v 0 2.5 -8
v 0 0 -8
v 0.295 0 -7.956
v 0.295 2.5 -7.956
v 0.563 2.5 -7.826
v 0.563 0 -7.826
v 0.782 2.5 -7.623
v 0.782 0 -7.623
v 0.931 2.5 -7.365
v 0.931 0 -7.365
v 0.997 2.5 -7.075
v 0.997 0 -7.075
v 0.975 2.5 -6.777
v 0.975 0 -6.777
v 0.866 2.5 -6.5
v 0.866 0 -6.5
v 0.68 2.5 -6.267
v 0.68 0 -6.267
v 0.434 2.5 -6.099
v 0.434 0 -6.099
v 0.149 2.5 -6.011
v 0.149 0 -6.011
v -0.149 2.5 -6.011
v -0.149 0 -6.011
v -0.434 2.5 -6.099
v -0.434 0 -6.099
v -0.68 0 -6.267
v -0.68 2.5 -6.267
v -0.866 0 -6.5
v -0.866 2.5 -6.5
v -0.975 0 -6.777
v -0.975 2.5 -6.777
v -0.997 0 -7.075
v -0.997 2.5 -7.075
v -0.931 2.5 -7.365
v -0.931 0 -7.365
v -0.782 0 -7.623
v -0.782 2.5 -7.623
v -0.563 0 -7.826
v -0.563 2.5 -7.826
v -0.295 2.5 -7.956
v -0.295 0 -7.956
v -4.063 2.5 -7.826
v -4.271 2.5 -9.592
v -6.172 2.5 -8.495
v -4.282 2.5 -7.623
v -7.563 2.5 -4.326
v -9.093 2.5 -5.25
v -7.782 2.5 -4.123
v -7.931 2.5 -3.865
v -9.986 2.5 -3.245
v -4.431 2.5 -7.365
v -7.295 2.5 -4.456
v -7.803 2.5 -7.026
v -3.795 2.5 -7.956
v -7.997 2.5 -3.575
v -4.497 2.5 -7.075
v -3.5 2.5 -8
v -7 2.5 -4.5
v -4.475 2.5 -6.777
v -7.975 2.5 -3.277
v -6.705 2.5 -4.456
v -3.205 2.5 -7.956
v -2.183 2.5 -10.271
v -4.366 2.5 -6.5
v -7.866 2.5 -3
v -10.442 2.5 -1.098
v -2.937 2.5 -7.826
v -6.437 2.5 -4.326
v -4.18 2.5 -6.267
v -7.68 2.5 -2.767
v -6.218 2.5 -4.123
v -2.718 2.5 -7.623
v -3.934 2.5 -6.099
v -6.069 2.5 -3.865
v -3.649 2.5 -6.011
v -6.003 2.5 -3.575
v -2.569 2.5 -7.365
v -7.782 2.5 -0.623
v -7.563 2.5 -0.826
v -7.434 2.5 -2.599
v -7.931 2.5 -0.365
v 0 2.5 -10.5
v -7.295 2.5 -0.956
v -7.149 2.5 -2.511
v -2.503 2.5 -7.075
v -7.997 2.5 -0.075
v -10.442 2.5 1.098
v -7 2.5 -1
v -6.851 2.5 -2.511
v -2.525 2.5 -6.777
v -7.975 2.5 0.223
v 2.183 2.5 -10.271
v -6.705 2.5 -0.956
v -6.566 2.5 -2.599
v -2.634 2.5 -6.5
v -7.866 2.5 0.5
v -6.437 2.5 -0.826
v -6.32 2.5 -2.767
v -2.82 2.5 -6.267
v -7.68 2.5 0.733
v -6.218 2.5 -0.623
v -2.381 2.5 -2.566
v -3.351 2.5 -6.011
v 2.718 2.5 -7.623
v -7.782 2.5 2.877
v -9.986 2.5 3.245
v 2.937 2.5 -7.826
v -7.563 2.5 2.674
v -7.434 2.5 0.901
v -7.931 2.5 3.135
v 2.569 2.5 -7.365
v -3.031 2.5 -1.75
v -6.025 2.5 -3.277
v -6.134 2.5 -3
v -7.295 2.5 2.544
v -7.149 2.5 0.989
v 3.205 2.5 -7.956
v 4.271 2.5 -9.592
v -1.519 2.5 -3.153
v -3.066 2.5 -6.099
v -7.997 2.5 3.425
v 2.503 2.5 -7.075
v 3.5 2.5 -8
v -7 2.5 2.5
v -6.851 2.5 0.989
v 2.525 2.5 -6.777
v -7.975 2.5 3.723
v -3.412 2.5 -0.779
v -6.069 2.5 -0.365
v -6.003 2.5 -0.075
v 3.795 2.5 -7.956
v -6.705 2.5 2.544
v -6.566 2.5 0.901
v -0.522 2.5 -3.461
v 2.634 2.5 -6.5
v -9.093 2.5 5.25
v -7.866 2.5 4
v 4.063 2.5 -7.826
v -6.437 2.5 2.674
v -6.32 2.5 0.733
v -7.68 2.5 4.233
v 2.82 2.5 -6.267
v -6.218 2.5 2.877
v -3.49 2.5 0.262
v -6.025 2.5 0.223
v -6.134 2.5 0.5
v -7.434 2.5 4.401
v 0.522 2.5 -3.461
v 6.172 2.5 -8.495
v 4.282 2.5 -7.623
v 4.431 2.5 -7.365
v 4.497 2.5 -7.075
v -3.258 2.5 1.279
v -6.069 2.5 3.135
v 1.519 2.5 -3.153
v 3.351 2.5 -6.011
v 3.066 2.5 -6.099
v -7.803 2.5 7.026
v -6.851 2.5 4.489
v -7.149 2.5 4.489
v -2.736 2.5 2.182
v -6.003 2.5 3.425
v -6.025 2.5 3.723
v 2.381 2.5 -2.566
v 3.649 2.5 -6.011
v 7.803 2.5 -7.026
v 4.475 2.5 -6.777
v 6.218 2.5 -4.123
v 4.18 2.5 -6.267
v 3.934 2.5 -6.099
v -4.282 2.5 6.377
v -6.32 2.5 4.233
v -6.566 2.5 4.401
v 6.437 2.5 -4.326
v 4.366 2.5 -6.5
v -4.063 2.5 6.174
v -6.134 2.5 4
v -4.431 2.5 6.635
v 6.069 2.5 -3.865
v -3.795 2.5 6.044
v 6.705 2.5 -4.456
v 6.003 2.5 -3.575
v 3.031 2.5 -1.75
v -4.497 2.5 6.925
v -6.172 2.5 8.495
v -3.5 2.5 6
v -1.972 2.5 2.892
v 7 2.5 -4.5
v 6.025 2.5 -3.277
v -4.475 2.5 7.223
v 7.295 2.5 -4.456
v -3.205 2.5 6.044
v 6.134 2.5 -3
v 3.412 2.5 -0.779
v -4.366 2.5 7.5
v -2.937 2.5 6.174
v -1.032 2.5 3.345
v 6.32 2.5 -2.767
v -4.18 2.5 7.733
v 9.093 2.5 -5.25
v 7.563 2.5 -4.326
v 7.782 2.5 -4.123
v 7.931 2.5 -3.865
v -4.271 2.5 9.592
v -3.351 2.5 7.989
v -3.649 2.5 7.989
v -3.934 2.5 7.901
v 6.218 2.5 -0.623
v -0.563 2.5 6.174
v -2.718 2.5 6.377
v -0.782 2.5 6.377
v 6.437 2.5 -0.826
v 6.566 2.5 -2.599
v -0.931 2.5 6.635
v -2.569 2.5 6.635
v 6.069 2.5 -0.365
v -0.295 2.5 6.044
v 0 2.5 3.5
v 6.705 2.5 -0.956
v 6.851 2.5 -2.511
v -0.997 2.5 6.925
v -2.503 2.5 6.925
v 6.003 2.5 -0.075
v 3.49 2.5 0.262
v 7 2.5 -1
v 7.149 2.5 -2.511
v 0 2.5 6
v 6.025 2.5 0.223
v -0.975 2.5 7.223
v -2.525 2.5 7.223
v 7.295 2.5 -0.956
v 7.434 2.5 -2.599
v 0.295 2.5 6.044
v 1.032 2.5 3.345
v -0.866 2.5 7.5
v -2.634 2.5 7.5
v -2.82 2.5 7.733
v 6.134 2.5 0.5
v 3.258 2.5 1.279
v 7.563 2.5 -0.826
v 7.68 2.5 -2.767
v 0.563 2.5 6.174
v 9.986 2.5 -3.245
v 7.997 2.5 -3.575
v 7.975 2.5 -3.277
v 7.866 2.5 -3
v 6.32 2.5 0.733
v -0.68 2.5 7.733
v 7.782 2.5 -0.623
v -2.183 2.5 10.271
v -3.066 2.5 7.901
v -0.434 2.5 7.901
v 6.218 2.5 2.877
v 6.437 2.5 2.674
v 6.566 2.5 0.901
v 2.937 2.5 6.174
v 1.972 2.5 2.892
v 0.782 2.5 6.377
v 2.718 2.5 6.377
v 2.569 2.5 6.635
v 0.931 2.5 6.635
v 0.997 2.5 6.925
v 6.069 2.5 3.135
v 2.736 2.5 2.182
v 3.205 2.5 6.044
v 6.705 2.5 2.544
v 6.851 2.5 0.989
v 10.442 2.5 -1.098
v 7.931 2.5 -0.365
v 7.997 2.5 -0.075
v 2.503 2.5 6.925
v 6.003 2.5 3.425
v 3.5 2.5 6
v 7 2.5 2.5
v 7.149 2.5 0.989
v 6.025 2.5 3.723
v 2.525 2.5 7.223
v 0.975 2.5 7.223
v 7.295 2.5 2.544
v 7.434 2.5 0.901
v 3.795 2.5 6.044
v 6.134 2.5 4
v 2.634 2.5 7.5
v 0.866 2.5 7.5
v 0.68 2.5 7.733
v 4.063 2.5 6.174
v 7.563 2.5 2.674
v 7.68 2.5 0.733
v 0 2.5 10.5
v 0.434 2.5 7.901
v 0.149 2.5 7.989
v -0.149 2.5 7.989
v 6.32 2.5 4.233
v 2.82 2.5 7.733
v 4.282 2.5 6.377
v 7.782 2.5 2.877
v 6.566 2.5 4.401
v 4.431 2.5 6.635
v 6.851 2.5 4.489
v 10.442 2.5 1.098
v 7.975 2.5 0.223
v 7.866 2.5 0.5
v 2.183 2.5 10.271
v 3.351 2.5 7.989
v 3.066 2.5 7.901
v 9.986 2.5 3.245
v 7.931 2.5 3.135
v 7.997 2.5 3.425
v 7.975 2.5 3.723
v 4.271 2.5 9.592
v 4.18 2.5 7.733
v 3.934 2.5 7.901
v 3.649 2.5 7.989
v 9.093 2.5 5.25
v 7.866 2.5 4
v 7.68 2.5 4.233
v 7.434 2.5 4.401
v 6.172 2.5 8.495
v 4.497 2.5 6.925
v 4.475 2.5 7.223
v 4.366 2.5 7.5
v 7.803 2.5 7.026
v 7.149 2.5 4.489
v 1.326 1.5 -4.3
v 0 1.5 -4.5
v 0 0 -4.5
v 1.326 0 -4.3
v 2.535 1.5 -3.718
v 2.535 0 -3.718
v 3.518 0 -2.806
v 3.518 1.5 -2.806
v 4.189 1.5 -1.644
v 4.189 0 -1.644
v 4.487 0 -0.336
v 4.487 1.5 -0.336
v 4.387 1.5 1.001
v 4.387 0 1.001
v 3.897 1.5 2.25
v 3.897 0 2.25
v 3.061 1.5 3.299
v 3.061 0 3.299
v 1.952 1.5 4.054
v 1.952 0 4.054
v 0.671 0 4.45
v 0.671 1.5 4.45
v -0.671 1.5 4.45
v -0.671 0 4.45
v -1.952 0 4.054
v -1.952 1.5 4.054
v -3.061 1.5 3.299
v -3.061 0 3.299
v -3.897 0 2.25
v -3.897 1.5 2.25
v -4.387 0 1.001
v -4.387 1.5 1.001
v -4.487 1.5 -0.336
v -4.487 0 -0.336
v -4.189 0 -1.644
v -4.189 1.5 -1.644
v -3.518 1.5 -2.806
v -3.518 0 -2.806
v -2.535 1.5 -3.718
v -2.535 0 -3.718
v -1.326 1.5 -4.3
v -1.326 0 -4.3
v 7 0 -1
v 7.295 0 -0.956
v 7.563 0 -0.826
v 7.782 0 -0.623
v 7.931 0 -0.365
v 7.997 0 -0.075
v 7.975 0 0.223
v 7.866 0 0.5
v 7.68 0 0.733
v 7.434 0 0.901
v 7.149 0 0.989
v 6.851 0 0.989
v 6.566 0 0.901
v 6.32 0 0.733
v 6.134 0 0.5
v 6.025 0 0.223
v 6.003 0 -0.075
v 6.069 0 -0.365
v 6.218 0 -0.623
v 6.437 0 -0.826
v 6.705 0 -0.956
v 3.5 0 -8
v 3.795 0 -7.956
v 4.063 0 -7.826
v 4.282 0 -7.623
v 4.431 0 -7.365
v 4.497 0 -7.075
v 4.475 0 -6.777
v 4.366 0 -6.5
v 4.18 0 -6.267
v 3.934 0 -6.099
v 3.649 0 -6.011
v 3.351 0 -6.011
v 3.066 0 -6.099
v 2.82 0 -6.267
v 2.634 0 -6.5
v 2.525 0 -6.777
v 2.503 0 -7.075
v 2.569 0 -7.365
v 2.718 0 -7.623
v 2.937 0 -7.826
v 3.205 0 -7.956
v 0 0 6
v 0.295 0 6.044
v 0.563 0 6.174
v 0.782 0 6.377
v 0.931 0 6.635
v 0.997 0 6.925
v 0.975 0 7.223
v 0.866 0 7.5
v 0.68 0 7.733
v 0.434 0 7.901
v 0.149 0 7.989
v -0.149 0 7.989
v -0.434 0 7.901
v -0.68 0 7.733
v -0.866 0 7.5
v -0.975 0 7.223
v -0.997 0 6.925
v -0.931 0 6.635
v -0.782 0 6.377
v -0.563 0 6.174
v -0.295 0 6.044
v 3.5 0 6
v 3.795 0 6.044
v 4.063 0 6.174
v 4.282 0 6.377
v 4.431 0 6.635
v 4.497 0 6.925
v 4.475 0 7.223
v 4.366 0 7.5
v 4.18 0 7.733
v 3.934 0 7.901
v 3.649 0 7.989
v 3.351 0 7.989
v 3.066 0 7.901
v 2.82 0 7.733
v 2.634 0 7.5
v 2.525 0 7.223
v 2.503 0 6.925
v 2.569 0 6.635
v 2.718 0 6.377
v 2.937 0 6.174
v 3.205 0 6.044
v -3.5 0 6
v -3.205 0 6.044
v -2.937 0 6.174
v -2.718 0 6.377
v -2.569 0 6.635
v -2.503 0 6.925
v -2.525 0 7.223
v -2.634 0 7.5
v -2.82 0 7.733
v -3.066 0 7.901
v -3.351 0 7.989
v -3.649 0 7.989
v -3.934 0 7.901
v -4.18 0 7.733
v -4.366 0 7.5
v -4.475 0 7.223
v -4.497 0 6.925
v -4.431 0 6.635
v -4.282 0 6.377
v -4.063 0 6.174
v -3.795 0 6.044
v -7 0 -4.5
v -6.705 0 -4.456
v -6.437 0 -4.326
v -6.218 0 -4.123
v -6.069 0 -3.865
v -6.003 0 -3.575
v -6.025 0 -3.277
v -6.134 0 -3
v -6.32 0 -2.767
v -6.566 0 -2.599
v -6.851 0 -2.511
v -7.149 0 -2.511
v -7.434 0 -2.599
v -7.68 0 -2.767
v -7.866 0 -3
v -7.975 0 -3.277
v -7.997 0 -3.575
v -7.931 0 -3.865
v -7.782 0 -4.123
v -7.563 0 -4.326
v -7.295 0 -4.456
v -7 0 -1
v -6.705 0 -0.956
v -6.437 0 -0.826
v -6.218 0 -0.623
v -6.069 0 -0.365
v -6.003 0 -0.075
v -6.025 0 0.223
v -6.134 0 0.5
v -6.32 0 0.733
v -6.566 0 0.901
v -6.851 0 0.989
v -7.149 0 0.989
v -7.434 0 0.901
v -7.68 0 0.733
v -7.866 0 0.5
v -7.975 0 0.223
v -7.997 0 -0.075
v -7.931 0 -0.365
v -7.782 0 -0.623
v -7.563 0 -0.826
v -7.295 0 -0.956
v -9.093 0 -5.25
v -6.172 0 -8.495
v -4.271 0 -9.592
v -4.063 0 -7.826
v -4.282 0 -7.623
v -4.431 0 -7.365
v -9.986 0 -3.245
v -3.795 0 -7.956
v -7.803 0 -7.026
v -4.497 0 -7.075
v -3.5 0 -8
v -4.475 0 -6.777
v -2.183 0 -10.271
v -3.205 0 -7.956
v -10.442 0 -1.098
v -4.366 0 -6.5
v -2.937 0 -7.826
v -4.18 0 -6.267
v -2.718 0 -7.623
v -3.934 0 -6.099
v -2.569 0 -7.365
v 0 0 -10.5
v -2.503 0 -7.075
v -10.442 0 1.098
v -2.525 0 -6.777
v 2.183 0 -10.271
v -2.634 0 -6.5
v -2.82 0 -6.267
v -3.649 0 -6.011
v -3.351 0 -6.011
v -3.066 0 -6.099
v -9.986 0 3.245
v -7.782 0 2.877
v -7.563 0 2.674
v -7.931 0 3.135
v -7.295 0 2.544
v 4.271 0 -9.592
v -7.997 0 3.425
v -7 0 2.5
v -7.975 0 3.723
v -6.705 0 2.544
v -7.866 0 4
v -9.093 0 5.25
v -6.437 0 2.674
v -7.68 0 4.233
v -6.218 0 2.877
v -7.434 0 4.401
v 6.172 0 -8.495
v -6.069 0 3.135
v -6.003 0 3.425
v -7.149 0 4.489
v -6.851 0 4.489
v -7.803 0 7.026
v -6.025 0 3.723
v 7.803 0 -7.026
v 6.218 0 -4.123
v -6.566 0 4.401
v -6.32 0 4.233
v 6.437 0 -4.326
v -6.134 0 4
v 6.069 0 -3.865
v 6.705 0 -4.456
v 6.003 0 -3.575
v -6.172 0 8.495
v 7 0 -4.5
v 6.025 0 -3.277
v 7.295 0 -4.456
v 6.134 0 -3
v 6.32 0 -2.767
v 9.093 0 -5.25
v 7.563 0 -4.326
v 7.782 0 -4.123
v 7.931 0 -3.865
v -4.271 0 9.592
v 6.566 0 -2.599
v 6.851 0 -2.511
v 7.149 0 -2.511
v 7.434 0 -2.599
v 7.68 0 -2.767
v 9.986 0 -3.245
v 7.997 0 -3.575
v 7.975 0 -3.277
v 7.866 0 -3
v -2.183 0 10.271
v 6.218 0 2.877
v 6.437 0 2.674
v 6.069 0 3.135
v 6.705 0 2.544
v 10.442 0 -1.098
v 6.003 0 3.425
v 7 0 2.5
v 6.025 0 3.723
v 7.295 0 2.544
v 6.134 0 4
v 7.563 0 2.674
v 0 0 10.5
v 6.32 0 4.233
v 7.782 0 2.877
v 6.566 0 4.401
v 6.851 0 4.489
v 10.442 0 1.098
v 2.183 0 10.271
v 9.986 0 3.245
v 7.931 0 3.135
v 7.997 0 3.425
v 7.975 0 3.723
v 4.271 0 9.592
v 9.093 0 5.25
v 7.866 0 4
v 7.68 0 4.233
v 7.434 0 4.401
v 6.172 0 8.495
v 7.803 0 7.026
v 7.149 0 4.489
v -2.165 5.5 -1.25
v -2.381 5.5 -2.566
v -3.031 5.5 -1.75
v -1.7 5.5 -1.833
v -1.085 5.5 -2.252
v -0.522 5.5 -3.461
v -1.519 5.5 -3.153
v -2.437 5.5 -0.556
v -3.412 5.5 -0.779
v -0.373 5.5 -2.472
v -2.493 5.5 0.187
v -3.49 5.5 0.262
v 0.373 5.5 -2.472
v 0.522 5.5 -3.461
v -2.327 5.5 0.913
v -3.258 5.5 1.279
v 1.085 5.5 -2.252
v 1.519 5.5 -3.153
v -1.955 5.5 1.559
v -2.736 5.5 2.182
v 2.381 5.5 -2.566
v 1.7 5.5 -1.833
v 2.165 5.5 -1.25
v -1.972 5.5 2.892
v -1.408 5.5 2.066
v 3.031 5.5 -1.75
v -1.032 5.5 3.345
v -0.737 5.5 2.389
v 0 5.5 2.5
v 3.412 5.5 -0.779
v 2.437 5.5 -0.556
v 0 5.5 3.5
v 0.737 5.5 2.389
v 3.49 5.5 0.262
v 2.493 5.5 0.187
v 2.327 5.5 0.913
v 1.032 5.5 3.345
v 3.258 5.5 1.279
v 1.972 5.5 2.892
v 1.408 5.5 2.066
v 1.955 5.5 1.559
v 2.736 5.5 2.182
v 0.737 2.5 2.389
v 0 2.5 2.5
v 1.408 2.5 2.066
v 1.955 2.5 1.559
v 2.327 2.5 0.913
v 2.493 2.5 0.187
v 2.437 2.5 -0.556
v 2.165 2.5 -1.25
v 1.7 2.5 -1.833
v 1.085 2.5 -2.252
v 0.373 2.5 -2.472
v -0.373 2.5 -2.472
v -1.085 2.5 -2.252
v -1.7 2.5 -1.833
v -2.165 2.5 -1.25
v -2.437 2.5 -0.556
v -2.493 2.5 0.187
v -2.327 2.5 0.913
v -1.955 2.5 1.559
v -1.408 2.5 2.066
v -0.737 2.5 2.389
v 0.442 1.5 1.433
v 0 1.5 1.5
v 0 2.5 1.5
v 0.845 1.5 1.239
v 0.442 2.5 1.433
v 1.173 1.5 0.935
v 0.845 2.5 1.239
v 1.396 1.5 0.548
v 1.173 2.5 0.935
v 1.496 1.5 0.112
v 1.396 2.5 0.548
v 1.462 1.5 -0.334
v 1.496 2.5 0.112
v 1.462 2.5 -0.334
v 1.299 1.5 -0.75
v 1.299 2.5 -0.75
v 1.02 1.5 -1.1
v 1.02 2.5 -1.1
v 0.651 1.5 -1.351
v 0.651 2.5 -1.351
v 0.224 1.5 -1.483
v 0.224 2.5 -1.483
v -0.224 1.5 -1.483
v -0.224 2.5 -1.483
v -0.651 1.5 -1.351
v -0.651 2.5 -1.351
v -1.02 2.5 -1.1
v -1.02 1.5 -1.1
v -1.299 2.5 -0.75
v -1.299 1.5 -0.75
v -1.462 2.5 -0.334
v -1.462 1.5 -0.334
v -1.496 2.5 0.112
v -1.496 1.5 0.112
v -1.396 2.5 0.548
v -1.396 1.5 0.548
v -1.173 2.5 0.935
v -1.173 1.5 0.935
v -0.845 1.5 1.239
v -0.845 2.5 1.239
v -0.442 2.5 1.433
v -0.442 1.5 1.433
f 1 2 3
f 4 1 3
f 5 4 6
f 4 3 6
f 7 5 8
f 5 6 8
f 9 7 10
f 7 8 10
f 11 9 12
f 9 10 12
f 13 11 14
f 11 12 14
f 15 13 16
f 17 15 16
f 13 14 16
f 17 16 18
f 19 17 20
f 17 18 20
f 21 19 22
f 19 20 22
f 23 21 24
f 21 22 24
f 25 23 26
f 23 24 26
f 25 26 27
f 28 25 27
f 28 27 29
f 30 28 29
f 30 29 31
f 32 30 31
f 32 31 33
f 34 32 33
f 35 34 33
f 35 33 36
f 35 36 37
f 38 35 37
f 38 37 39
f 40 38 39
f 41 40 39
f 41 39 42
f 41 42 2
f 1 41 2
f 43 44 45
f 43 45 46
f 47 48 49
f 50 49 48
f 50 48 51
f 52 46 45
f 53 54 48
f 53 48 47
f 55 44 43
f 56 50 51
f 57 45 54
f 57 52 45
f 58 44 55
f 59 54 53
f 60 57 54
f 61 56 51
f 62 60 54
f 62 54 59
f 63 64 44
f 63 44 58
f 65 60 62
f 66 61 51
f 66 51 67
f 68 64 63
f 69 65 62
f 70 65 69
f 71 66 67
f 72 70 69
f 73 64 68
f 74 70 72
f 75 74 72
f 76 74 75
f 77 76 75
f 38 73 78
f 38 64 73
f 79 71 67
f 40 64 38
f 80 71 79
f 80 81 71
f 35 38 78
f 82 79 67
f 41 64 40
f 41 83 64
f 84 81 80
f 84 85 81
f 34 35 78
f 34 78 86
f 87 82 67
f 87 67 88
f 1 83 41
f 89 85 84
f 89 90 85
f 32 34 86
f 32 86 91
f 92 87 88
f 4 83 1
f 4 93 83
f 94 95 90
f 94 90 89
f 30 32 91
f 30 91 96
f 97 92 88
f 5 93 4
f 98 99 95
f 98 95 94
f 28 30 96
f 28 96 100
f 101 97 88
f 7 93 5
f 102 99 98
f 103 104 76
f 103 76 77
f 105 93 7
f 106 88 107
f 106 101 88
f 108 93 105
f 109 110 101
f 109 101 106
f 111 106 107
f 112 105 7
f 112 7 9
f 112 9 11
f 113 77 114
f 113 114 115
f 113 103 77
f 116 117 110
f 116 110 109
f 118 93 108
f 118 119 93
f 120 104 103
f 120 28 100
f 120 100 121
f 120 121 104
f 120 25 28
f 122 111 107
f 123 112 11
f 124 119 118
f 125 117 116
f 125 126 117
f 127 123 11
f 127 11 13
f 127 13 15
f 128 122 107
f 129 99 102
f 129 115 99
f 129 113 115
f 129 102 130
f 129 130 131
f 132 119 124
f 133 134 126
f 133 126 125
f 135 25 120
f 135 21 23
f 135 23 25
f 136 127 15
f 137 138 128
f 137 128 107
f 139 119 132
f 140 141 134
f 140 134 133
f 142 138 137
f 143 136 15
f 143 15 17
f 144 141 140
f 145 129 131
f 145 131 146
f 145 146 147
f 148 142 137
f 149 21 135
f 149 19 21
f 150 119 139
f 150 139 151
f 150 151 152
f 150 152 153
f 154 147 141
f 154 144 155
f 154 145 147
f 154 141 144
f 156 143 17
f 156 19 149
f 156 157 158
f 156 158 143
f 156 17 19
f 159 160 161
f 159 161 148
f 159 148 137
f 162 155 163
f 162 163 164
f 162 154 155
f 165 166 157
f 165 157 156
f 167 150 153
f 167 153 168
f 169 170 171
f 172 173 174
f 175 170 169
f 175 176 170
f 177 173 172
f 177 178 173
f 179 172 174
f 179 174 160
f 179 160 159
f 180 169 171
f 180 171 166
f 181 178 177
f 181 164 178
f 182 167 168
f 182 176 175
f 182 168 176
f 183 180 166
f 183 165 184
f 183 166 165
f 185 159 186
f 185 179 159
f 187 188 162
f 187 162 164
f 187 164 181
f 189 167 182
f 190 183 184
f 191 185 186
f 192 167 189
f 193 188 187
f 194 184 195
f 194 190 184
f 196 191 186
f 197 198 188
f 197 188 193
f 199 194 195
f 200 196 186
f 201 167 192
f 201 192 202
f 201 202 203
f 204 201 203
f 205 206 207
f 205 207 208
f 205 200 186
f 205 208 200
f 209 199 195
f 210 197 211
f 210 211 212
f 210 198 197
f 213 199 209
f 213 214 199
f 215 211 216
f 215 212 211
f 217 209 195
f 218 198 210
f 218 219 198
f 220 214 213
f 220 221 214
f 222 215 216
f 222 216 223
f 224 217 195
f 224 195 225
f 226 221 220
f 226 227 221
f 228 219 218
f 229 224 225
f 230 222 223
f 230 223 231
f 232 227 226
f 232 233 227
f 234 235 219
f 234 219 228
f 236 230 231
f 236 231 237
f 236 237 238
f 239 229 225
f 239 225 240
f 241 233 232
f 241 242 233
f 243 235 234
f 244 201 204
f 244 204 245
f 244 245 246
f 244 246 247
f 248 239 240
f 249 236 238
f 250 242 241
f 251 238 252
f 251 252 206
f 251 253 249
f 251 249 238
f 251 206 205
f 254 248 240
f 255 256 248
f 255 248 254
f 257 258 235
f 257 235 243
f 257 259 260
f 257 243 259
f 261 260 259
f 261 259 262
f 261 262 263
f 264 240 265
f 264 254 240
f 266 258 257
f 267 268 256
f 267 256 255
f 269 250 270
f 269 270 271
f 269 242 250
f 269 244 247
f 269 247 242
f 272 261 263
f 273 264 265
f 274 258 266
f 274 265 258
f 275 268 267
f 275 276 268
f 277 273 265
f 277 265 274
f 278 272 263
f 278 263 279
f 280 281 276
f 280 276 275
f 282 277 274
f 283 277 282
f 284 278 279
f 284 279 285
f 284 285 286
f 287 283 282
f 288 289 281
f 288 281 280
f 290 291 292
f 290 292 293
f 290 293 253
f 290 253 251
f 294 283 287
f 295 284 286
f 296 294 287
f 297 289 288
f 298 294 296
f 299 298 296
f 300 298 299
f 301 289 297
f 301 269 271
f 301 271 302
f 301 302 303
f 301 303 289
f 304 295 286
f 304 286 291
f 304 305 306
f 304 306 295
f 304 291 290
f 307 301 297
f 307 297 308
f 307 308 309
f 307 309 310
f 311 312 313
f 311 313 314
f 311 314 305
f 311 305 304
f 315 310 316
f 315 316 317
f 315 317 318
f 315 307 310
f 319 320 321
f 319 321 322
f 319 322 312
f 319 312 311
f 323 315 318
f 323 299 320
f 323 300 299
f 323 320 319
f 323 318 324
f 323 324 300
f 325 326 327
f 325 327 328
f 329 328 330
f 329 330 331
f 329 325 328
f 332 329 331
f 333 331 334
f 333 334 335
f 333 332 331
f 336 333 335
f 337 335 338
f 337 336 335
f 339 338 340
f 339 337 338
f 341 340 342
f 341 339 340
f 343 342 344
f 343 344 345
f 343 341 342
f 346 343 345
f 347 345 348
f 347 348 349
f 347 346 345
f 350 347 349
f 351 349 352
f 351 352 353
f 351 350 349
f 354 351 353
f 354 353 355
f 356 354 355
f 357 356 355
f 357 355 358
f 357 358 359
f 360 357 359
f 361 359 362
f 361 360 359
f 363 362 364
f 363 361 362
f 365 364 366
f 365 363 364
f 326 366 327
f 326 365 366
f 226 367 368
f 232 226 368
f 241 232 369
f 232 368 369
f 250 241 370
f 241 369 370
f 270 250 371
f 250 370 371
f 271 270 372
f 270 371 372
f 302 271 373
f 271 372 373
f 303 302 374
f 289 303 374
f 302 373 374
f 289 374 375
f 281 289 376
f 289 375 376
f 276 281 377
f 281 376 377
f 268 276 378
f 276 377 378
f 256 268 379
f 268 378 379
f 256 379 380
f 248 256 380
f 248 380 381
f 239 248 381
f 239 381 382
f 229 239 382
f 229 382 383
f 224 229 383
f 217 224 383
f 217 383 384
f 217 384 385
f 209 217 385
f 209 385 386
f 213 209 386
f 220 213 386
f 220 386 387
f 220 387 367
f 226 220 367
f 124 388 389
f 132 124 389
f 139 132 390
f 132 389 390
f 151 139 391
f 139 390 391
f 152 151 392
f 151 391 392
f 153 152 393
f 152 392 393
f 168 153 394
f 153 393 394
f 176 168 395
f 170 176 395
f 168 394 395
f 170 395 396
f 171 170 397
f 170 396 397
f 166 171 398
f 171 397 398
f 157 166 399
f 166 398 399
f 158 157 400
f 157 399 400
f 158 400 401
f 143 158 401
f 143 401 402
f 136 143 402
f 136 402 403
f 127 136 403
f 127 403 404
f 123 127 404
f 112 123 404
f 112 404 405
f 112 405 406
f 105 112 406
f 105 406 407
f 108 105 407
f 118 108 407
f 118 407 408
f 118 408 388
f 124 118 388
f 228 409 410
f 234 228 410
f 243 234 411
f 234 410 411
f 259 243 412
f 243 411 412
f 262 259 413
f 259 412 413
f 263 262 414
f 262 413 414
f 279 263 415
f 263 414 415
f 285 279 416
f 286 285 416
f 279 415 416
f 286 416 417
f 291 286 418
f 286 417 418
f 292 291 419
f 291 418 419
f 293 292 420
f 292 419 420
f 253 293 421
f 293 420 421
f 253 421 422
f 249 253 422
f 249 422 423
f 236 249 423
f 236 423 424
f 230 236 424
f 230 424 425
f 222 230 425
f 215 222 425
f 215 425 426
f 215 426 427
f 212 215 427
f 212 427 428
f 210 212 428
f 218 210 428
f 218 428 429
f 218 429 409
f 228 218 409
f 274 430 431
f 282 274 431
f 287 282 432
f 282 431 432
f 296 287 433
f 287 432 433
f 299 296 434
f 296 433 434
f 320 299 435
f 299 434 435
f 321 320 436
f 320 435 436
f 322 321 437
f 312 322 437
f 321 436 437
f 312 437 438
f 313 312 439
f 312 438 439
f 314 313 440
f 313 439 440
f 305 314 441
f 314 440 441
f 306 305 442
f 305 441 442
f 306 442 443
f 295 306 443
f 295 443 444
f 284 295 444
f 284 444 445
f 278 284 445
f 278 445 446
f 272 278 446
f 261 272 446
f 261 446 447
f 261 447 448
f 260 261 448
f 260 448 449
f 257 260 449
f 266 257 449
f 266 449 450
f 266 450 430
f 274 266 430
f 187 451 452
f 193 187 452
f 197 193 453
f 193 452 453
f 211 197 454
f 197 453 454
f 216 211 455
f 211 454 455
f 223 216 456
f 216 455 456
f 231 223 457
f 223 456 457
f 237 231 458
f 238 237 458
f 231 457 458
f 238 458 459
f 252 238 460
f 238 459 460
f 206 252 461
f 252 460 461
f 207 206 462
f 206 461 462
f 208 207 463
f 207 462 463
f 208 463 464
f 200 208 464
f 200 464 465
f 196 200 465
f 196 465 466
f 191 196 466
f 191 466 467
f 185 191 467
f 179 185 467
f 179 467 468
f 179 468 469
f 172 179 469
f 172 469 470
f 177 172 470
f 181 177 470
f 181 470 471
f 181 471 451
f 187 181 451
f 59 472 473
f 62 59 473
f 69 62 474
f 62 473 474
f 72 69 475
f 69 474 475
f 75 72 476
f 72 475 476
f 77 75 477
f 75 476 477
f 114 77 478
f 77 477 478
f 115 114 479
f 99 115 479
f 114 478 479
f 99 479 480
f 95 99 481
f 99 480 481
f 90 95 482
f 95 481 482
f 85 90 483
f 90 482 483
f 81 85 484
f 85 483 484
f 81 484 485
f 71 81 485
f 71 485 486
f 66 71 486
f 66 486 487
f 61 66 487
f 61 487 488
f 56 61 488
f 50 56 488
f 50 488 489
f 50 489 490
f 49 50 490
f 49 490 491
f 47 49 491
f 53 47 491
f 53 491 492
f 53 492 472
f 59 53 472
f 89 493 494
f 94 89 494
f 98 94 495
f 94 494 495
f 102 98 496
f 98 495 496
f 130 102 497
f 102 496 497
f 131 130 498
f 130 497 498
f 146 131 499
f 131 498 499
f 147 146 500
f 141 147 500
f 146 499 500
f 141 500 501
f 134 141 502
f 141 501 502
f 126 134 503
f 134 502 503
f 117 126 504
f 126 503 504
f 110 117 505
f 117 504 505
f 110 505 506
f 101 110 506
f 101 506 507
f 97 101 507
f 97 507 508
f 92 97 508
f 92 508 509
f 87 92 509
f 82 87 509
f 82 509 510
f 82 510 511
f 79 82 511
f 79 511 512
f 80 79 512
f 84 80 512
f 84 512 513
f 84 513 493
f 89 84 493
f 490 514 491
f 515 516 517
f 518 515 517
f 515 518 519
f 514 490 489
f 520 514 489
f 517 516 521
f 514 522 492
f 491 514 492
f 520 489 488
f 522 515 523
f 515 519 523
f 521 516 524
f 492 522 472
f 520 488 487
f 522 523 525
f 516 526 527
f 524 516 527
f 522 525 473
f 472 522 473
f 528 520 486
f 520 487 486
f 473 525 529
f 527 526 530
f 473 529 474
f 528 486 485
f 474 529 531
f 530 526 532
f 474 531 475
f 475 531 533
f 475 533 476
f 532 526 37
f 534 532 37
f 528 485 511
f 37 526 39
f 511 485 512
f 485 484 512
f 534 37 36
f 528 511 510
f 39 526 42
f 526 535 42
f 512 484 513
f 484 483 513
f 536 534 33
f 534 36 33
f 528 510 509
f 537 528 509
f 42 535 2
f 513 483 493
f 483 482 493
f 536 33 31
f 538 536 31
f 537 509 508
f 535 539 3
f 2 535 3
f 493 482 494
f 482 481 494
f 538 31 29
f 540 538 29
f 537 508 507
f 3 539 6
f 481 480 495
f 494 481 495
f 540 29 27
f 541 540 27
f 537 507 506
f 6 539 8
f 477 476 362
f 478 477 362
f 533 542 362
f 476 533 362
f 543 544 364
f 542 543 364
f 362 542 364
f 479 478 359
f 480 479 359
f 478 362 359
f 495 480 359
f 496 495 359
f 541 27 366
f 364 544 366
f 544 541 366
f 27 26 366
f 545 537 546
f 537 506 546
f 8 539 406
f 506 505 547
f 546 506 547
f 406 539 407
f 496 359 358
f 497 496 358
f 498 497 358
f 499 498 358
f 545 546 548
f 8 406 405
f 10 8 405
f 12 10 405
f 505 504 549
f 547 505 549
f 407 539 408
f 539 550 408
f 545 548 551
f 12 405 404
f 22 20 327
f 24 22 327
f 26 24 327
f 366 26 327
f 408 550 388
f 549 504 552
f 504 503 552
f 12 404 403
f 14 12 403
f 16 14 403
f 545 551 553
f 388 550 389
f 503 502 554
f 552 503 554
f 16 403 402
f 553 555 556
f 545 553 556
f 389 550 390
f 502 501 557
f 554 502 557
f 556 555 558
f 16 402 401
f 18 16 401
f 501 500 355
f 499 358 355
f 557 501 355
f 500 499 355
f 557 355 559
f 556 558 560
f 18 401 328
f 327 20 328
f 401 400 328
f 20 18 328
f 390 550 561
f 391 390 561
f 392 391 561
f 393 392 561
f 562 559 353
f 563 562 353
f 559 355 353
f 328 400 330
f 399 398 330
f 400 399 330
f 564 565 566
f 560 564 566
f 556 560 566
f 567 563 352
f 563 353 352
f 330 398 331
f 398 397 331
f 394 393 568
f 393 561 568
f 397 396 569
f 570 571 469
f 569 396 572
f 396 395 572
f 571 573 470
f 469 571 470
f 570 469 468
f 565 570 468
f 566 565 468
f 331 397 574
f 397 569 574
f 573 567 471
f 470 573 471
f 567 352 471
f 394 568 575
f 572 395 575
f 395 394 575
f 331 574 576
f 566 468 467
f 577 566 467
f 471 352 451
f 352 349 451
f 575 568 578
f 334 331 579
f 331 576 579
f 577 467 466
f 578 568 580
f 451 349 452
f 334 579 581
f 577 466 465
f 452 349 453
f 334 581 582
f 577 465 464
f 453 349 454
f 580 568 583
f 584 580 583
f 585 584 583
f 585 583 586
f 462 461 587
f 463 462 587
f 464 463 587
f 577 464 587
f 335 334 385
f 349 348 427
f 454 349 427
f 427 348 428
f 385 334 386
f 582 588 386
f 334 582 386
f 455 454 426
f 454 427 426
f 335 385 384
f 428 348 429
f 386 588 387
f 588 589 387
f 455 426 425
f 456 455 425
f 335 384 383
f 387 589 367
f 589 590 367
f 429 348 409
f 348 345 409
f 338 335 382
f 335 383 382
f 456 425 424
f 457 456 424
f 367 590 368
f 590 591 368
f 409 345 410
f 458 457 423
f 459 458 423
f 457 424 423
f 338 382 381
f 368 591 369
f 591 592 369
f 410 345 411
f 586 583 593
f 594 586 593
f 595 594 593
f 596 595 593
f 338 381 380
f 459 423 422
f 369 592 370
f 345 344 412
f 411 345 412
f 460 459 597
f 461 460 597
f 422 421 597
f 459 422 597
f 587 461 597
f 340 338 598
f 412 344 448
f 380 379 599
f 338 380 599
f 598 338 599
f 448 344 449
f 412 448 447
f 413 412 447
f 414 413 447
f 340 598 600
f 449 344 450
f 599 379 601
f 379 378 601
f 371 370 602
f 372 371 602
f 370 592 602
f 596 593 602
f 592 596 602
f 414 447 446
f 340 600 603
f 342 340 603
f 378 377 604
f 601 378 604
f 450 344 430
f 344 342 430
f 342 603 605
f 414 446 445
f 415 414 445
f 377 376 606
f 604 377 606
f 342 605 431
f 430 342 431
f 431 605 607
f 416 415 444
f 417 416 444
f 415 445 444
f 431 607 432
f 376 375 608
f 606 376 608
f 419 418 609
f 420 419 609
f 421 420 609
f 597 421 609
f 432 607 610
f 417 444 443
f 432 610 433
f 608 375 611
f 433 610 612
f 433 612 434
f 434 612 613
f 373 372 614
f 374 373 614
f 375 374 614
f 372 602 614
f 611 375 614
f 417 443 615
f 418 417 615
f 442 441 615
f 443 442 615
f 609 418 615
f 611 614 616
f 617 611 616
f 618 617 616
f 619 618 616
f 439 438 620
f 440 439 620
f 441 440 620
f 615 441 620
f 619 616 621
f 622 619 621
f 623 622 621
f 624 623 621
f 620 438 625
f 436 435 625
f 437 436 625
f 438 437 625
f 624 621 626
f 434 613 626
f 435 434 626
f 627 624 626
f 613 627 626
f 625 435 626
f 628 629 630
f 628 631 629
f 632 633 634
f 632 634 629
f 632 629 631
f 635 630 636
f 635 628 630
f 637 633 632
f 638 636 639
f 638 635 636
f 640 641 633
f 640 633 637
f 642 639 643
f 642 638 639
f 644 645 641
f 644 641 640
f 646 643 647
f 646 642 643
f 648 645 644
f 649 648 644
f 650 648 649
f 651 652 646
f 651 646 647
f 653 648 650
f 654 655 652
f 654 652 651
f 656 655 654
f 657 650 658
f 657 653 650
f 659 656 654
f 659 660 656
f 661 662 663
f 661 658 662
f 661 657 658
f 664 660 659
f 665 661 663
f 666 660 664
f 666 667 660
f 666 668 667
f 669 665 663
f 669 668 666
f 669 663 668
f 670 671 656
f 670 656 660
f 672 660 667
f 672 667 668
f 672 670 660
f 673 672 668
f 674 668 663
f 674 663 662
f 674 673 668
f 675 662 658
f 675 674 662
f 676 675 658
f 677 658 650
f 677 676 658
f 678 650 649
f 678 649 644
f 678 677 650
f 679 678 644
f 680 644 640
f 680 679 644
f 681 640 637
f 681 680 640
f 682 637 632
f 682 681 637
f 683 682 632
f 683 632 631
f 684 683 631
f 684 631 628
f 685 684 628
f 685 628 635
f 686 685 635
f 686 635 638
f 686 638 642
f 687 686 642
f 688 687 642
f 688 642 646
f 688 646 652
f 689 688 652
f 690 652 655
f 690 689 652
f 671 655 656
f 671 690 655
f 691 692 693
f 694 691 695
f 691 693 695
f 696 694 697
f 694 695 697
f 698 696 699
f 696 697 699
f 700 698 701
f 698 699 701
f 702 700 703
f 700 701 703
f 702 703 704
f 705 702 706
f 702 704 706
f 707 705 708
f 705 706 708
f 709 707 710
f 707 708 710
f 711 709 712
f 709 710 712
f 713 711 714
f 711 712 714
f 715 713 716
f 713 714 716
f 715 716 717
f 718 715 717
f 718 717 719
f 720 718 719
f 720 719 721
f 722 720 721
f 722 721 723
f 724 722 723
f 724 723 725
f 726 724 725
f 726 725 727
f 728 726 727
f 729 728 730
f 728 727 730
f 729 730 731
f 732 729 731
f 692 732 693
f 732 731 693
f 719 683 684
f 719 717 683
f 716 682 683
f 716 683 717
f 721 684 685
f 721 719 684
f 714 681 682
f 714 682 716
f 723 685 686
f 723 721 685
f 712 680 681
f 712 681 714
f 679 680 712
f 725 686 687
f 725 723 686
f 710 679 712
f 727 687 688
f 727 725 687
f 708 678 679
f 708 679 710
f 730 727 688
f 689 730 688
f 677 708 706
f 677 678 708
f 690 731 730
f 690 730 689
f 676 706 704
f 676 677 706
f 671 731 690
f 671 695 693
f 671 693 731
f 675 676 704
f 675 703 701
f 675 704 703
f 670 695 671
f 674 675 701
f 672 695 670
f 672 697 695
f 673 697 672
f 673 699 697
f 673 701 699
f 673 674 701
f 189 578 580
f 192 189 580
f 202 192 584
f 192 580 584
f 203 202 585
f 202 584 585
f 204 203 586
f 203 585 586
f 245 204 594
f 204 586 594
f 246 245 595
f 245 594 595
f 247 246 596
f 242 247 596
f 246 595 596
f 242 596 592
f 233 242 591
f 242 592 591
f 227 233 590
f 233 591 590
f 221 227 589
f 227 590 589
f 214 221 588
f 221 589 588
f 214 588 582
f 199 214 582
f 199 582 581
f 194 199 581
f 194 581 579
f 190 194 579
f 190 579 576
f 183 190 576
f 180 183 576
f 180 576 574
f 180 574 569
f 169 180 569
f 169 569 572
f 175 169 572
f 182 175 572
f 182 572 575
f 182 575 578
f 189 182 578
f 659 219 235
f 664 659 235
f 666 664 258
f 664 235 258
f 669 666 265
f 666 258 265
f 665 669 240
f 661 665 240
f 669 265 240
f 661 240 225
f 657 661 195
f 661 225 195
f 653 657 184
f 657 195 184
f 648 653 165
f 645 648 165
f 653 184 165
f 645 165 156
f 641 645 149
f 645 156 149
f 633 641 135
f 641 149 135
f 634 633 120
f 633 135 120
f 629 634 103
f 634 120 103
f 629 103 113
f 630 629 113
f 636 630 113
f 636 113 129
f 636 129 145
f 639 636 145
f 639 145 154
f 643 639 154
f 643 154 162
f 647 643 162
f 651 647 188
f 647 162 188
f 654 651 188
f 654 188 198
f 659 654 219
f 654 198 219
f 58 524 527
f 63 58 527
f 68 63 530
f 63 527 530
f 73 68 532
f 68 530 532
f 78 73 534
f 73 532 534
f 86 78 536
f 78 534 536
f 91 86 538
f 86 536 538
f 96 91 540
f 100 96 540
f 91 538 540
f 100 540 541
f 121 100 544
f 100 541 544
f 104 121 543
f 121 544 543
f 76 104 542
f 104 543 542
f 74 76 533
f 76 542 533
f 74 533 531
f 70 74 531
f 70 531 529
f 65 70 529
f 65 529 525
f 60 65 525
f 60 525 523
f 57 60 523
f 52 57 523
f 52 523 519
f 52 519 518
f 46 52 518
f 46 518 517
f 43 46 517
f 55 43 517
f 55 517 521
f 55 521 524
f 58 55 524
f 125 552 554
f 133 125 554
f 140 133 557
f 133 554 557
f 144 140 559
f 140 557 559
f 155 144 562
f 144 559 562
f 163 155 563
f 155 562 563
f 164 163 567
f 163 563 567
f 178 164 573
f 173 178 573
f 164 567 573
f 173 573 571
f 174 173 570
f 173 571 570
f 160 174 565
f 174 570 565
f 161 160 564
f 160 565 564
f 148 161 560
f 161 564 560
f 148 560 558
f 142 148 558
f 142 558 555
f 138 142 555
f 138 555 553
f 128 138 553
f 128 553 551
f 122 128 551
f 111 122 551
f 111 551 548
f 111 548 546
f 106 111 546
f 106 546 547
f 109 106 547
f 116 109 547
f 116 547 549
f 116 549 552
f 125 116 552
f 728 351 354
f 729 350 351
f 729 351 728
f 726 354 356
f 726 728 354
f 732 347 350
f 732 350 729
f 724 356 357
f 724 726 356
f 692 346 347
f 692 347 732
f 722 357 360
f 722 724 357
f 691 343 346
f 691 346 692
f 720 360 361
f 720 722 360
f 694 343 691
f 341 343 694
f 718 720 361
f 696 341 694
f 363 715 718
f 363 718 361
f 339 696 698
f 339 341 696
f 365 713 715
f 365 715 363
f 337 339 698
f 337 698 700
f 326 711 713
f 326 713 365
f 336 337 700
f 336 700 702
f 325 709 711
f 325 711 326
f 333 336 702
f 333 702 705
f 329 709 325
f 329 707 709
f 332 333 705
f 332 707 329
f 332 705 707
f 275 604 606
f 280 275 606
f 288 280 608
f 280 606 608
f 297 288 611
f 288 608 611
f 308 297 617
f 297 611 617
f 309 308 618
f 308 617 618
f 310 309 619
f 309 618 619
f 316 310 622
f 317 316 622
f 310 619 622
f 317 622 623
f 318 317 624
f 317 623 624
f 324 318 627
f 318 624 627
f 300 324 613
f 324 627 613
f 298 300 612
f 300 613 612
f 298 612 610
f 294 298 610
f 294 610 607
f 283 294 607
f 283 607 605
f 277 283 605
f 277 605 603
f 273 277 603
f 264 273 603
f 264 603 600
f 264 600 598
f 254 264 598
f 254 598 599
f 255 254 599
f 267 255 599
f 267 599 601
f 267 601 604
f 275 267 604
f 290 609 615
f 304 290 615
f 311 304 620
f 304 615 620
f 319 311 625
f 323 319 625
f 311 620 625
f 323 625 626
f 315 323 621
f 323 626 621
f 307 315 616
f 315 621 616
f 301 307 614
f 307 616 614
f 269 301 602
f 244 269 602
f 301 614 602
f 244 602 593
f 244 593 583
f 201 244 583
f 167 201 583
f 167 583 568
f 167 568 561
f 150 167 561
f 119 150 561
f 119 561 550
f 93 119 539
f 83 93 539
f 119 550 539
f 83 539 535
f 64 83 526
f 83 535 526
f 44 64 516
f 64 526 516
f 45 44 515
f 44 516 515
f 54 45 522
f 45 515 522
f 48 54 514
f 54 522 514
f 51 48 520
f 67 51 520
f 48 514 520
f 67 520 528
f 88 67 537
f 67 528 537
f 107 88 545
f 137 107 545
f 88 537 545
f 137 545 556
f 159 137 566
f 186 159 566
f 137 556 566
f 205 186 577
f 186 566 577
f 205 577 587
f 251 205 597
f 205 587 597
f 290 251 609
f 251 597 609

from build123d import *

# Parameters (mm, degrees)
SKETCH1_R           = 10.5
BOSS_EXTRUDE1_DEPTH = 2.5
SKETCH2_R           = 3.5
SKETCH2_R_2         = 2.5
BOSS_EXTRUDE2_DEPTH = 3
SKETCH3_R           = 1.5
CUT_EXTRUDE1_DEPTH  = 3
CUT_EXTRUDE2_START  = -1.5
SKETCH4_R           = 4.5
SKETCH4_R_2         = 1.5
CUT_EXTRUDE2_DEPTH  = 1.5
SKETCH5_R           = 1
CUT_EXTRUDE3_DEPTH  = 3


with BuildPart() as part:
    # Sketch1 → Boss-Extrude1 (new body)
    with BuildSketch(Plane(origin=(0, 0, 0), x_dir=(1, 0, 0), z_dir=(0, 1, 0))):
        with Locations(Location((0, 0, 0), (0, 0, 270))):
            Circle(SKETCH1_R)
    extrude(amount=BOSS_EXTRUDE1_DEPTH)

    # Sketch2 → Boss-Extrude2 (add)
    with BuildSketch(Plane(origin=(0, 2.5, 0), x_dir=(1, 0, 0), z_dir=(0, 1, 0))):
        with Locations(Location((0, 0, 0), (0, 0, 270))):
            Circle(SKETCH2_R)
        with Locations(Location((0, 0, 0), (0, 0, 270))):
            Circle(SKETCH2_R_2, mode=Mode.SUBTRACT)
    extrude(amount=BOSS_EXTRUDE2_DEPTH)

    # Sketch3 → Cut-Extrude1 (cut)
    with BuildSketch(Plane(origin=(0, 2.5, 0), x_dir=(1, 0, 0), z_dir=(0, 1, 0))):
        with Locations(Location((0, 0, 0), (0, 0, 270))):
            Circle(SKETCH3_R)
    extrude(amount=-CUT_EXTRUDE1_DEPTH, mode=Mode.SUBTRACT)

    # Sketch4 → Cut-Extrude2 (cut)
    with BuildSketch(Plane.XZ.offset(CUT_EXTRUDE2_START)):
        with Locations(Location((0, 0, 0), (0, 0, 270))):
            Circle(SKETCH4_R)
        with Locations(Location((0, 0, 0), (0, 0, 90))):
            Circle(SKETCH4_R_2, mode=Mode.SUBTRACT)
    extrude(amount=CUT_EXTRUDE2_DEPTH, mode=Mode.SUBTRACT)

    # Sketch5 → Cut-Extrude3 (cut)
    with BuildSketch(Plane.XZ):
        with Locations(Location((0, 7, 0), (0, 0, 270))):
            Circle(SKETCH5_R)
        with Locations(Location((3.5, 7, 0), (0, 0, 270))):
            Circle(SKETCH5_R)
        with Locations(Location((-3.5, 7, 0), (0, 0, 270))):
            Circle(SKETCH5_R)
        with Locations(Location((7, 3.5, 0), (0, 0, 270))):
            Circle(SKETCH5_R)
        with Locations(Location((7, 0, 0), (0, 0, 270))):
            Circle(SKETCH5_R)
        with Locations(Location((7, -3.5, 0), (0, 0, 270))):
            Circle(SKETCH5_R)
        with Locations(Location((3.5, -7, 0), (0, 0, 270))):
            Circle(SKETCH5_R)
        with Locations(Location((0, -7, 0), (0, 0, 270))):
            Circle(SKETCH5_R)
        with Locations(Location((-3.5, -7, 0), (0, 0, 270))):
            Circle(SKETCH5_R)
        with Locations(Location((-7, -3.5, 0), (0, 0, 270))):
            Circle(SKETCH5_R)
        with Locations(Location((-7, 0, 0), (0, 0, 270))):
            Circle(SKETCH5_R)
        with Locations(Location((-7, 3.5, 0), (0, 0, 270))):
            Circle(SKETCH5_R)
    extrude(amount=-CUT_EXTRUDE3_DEPTH, mode=Mode.SUBTRACT)


solid = part.part
